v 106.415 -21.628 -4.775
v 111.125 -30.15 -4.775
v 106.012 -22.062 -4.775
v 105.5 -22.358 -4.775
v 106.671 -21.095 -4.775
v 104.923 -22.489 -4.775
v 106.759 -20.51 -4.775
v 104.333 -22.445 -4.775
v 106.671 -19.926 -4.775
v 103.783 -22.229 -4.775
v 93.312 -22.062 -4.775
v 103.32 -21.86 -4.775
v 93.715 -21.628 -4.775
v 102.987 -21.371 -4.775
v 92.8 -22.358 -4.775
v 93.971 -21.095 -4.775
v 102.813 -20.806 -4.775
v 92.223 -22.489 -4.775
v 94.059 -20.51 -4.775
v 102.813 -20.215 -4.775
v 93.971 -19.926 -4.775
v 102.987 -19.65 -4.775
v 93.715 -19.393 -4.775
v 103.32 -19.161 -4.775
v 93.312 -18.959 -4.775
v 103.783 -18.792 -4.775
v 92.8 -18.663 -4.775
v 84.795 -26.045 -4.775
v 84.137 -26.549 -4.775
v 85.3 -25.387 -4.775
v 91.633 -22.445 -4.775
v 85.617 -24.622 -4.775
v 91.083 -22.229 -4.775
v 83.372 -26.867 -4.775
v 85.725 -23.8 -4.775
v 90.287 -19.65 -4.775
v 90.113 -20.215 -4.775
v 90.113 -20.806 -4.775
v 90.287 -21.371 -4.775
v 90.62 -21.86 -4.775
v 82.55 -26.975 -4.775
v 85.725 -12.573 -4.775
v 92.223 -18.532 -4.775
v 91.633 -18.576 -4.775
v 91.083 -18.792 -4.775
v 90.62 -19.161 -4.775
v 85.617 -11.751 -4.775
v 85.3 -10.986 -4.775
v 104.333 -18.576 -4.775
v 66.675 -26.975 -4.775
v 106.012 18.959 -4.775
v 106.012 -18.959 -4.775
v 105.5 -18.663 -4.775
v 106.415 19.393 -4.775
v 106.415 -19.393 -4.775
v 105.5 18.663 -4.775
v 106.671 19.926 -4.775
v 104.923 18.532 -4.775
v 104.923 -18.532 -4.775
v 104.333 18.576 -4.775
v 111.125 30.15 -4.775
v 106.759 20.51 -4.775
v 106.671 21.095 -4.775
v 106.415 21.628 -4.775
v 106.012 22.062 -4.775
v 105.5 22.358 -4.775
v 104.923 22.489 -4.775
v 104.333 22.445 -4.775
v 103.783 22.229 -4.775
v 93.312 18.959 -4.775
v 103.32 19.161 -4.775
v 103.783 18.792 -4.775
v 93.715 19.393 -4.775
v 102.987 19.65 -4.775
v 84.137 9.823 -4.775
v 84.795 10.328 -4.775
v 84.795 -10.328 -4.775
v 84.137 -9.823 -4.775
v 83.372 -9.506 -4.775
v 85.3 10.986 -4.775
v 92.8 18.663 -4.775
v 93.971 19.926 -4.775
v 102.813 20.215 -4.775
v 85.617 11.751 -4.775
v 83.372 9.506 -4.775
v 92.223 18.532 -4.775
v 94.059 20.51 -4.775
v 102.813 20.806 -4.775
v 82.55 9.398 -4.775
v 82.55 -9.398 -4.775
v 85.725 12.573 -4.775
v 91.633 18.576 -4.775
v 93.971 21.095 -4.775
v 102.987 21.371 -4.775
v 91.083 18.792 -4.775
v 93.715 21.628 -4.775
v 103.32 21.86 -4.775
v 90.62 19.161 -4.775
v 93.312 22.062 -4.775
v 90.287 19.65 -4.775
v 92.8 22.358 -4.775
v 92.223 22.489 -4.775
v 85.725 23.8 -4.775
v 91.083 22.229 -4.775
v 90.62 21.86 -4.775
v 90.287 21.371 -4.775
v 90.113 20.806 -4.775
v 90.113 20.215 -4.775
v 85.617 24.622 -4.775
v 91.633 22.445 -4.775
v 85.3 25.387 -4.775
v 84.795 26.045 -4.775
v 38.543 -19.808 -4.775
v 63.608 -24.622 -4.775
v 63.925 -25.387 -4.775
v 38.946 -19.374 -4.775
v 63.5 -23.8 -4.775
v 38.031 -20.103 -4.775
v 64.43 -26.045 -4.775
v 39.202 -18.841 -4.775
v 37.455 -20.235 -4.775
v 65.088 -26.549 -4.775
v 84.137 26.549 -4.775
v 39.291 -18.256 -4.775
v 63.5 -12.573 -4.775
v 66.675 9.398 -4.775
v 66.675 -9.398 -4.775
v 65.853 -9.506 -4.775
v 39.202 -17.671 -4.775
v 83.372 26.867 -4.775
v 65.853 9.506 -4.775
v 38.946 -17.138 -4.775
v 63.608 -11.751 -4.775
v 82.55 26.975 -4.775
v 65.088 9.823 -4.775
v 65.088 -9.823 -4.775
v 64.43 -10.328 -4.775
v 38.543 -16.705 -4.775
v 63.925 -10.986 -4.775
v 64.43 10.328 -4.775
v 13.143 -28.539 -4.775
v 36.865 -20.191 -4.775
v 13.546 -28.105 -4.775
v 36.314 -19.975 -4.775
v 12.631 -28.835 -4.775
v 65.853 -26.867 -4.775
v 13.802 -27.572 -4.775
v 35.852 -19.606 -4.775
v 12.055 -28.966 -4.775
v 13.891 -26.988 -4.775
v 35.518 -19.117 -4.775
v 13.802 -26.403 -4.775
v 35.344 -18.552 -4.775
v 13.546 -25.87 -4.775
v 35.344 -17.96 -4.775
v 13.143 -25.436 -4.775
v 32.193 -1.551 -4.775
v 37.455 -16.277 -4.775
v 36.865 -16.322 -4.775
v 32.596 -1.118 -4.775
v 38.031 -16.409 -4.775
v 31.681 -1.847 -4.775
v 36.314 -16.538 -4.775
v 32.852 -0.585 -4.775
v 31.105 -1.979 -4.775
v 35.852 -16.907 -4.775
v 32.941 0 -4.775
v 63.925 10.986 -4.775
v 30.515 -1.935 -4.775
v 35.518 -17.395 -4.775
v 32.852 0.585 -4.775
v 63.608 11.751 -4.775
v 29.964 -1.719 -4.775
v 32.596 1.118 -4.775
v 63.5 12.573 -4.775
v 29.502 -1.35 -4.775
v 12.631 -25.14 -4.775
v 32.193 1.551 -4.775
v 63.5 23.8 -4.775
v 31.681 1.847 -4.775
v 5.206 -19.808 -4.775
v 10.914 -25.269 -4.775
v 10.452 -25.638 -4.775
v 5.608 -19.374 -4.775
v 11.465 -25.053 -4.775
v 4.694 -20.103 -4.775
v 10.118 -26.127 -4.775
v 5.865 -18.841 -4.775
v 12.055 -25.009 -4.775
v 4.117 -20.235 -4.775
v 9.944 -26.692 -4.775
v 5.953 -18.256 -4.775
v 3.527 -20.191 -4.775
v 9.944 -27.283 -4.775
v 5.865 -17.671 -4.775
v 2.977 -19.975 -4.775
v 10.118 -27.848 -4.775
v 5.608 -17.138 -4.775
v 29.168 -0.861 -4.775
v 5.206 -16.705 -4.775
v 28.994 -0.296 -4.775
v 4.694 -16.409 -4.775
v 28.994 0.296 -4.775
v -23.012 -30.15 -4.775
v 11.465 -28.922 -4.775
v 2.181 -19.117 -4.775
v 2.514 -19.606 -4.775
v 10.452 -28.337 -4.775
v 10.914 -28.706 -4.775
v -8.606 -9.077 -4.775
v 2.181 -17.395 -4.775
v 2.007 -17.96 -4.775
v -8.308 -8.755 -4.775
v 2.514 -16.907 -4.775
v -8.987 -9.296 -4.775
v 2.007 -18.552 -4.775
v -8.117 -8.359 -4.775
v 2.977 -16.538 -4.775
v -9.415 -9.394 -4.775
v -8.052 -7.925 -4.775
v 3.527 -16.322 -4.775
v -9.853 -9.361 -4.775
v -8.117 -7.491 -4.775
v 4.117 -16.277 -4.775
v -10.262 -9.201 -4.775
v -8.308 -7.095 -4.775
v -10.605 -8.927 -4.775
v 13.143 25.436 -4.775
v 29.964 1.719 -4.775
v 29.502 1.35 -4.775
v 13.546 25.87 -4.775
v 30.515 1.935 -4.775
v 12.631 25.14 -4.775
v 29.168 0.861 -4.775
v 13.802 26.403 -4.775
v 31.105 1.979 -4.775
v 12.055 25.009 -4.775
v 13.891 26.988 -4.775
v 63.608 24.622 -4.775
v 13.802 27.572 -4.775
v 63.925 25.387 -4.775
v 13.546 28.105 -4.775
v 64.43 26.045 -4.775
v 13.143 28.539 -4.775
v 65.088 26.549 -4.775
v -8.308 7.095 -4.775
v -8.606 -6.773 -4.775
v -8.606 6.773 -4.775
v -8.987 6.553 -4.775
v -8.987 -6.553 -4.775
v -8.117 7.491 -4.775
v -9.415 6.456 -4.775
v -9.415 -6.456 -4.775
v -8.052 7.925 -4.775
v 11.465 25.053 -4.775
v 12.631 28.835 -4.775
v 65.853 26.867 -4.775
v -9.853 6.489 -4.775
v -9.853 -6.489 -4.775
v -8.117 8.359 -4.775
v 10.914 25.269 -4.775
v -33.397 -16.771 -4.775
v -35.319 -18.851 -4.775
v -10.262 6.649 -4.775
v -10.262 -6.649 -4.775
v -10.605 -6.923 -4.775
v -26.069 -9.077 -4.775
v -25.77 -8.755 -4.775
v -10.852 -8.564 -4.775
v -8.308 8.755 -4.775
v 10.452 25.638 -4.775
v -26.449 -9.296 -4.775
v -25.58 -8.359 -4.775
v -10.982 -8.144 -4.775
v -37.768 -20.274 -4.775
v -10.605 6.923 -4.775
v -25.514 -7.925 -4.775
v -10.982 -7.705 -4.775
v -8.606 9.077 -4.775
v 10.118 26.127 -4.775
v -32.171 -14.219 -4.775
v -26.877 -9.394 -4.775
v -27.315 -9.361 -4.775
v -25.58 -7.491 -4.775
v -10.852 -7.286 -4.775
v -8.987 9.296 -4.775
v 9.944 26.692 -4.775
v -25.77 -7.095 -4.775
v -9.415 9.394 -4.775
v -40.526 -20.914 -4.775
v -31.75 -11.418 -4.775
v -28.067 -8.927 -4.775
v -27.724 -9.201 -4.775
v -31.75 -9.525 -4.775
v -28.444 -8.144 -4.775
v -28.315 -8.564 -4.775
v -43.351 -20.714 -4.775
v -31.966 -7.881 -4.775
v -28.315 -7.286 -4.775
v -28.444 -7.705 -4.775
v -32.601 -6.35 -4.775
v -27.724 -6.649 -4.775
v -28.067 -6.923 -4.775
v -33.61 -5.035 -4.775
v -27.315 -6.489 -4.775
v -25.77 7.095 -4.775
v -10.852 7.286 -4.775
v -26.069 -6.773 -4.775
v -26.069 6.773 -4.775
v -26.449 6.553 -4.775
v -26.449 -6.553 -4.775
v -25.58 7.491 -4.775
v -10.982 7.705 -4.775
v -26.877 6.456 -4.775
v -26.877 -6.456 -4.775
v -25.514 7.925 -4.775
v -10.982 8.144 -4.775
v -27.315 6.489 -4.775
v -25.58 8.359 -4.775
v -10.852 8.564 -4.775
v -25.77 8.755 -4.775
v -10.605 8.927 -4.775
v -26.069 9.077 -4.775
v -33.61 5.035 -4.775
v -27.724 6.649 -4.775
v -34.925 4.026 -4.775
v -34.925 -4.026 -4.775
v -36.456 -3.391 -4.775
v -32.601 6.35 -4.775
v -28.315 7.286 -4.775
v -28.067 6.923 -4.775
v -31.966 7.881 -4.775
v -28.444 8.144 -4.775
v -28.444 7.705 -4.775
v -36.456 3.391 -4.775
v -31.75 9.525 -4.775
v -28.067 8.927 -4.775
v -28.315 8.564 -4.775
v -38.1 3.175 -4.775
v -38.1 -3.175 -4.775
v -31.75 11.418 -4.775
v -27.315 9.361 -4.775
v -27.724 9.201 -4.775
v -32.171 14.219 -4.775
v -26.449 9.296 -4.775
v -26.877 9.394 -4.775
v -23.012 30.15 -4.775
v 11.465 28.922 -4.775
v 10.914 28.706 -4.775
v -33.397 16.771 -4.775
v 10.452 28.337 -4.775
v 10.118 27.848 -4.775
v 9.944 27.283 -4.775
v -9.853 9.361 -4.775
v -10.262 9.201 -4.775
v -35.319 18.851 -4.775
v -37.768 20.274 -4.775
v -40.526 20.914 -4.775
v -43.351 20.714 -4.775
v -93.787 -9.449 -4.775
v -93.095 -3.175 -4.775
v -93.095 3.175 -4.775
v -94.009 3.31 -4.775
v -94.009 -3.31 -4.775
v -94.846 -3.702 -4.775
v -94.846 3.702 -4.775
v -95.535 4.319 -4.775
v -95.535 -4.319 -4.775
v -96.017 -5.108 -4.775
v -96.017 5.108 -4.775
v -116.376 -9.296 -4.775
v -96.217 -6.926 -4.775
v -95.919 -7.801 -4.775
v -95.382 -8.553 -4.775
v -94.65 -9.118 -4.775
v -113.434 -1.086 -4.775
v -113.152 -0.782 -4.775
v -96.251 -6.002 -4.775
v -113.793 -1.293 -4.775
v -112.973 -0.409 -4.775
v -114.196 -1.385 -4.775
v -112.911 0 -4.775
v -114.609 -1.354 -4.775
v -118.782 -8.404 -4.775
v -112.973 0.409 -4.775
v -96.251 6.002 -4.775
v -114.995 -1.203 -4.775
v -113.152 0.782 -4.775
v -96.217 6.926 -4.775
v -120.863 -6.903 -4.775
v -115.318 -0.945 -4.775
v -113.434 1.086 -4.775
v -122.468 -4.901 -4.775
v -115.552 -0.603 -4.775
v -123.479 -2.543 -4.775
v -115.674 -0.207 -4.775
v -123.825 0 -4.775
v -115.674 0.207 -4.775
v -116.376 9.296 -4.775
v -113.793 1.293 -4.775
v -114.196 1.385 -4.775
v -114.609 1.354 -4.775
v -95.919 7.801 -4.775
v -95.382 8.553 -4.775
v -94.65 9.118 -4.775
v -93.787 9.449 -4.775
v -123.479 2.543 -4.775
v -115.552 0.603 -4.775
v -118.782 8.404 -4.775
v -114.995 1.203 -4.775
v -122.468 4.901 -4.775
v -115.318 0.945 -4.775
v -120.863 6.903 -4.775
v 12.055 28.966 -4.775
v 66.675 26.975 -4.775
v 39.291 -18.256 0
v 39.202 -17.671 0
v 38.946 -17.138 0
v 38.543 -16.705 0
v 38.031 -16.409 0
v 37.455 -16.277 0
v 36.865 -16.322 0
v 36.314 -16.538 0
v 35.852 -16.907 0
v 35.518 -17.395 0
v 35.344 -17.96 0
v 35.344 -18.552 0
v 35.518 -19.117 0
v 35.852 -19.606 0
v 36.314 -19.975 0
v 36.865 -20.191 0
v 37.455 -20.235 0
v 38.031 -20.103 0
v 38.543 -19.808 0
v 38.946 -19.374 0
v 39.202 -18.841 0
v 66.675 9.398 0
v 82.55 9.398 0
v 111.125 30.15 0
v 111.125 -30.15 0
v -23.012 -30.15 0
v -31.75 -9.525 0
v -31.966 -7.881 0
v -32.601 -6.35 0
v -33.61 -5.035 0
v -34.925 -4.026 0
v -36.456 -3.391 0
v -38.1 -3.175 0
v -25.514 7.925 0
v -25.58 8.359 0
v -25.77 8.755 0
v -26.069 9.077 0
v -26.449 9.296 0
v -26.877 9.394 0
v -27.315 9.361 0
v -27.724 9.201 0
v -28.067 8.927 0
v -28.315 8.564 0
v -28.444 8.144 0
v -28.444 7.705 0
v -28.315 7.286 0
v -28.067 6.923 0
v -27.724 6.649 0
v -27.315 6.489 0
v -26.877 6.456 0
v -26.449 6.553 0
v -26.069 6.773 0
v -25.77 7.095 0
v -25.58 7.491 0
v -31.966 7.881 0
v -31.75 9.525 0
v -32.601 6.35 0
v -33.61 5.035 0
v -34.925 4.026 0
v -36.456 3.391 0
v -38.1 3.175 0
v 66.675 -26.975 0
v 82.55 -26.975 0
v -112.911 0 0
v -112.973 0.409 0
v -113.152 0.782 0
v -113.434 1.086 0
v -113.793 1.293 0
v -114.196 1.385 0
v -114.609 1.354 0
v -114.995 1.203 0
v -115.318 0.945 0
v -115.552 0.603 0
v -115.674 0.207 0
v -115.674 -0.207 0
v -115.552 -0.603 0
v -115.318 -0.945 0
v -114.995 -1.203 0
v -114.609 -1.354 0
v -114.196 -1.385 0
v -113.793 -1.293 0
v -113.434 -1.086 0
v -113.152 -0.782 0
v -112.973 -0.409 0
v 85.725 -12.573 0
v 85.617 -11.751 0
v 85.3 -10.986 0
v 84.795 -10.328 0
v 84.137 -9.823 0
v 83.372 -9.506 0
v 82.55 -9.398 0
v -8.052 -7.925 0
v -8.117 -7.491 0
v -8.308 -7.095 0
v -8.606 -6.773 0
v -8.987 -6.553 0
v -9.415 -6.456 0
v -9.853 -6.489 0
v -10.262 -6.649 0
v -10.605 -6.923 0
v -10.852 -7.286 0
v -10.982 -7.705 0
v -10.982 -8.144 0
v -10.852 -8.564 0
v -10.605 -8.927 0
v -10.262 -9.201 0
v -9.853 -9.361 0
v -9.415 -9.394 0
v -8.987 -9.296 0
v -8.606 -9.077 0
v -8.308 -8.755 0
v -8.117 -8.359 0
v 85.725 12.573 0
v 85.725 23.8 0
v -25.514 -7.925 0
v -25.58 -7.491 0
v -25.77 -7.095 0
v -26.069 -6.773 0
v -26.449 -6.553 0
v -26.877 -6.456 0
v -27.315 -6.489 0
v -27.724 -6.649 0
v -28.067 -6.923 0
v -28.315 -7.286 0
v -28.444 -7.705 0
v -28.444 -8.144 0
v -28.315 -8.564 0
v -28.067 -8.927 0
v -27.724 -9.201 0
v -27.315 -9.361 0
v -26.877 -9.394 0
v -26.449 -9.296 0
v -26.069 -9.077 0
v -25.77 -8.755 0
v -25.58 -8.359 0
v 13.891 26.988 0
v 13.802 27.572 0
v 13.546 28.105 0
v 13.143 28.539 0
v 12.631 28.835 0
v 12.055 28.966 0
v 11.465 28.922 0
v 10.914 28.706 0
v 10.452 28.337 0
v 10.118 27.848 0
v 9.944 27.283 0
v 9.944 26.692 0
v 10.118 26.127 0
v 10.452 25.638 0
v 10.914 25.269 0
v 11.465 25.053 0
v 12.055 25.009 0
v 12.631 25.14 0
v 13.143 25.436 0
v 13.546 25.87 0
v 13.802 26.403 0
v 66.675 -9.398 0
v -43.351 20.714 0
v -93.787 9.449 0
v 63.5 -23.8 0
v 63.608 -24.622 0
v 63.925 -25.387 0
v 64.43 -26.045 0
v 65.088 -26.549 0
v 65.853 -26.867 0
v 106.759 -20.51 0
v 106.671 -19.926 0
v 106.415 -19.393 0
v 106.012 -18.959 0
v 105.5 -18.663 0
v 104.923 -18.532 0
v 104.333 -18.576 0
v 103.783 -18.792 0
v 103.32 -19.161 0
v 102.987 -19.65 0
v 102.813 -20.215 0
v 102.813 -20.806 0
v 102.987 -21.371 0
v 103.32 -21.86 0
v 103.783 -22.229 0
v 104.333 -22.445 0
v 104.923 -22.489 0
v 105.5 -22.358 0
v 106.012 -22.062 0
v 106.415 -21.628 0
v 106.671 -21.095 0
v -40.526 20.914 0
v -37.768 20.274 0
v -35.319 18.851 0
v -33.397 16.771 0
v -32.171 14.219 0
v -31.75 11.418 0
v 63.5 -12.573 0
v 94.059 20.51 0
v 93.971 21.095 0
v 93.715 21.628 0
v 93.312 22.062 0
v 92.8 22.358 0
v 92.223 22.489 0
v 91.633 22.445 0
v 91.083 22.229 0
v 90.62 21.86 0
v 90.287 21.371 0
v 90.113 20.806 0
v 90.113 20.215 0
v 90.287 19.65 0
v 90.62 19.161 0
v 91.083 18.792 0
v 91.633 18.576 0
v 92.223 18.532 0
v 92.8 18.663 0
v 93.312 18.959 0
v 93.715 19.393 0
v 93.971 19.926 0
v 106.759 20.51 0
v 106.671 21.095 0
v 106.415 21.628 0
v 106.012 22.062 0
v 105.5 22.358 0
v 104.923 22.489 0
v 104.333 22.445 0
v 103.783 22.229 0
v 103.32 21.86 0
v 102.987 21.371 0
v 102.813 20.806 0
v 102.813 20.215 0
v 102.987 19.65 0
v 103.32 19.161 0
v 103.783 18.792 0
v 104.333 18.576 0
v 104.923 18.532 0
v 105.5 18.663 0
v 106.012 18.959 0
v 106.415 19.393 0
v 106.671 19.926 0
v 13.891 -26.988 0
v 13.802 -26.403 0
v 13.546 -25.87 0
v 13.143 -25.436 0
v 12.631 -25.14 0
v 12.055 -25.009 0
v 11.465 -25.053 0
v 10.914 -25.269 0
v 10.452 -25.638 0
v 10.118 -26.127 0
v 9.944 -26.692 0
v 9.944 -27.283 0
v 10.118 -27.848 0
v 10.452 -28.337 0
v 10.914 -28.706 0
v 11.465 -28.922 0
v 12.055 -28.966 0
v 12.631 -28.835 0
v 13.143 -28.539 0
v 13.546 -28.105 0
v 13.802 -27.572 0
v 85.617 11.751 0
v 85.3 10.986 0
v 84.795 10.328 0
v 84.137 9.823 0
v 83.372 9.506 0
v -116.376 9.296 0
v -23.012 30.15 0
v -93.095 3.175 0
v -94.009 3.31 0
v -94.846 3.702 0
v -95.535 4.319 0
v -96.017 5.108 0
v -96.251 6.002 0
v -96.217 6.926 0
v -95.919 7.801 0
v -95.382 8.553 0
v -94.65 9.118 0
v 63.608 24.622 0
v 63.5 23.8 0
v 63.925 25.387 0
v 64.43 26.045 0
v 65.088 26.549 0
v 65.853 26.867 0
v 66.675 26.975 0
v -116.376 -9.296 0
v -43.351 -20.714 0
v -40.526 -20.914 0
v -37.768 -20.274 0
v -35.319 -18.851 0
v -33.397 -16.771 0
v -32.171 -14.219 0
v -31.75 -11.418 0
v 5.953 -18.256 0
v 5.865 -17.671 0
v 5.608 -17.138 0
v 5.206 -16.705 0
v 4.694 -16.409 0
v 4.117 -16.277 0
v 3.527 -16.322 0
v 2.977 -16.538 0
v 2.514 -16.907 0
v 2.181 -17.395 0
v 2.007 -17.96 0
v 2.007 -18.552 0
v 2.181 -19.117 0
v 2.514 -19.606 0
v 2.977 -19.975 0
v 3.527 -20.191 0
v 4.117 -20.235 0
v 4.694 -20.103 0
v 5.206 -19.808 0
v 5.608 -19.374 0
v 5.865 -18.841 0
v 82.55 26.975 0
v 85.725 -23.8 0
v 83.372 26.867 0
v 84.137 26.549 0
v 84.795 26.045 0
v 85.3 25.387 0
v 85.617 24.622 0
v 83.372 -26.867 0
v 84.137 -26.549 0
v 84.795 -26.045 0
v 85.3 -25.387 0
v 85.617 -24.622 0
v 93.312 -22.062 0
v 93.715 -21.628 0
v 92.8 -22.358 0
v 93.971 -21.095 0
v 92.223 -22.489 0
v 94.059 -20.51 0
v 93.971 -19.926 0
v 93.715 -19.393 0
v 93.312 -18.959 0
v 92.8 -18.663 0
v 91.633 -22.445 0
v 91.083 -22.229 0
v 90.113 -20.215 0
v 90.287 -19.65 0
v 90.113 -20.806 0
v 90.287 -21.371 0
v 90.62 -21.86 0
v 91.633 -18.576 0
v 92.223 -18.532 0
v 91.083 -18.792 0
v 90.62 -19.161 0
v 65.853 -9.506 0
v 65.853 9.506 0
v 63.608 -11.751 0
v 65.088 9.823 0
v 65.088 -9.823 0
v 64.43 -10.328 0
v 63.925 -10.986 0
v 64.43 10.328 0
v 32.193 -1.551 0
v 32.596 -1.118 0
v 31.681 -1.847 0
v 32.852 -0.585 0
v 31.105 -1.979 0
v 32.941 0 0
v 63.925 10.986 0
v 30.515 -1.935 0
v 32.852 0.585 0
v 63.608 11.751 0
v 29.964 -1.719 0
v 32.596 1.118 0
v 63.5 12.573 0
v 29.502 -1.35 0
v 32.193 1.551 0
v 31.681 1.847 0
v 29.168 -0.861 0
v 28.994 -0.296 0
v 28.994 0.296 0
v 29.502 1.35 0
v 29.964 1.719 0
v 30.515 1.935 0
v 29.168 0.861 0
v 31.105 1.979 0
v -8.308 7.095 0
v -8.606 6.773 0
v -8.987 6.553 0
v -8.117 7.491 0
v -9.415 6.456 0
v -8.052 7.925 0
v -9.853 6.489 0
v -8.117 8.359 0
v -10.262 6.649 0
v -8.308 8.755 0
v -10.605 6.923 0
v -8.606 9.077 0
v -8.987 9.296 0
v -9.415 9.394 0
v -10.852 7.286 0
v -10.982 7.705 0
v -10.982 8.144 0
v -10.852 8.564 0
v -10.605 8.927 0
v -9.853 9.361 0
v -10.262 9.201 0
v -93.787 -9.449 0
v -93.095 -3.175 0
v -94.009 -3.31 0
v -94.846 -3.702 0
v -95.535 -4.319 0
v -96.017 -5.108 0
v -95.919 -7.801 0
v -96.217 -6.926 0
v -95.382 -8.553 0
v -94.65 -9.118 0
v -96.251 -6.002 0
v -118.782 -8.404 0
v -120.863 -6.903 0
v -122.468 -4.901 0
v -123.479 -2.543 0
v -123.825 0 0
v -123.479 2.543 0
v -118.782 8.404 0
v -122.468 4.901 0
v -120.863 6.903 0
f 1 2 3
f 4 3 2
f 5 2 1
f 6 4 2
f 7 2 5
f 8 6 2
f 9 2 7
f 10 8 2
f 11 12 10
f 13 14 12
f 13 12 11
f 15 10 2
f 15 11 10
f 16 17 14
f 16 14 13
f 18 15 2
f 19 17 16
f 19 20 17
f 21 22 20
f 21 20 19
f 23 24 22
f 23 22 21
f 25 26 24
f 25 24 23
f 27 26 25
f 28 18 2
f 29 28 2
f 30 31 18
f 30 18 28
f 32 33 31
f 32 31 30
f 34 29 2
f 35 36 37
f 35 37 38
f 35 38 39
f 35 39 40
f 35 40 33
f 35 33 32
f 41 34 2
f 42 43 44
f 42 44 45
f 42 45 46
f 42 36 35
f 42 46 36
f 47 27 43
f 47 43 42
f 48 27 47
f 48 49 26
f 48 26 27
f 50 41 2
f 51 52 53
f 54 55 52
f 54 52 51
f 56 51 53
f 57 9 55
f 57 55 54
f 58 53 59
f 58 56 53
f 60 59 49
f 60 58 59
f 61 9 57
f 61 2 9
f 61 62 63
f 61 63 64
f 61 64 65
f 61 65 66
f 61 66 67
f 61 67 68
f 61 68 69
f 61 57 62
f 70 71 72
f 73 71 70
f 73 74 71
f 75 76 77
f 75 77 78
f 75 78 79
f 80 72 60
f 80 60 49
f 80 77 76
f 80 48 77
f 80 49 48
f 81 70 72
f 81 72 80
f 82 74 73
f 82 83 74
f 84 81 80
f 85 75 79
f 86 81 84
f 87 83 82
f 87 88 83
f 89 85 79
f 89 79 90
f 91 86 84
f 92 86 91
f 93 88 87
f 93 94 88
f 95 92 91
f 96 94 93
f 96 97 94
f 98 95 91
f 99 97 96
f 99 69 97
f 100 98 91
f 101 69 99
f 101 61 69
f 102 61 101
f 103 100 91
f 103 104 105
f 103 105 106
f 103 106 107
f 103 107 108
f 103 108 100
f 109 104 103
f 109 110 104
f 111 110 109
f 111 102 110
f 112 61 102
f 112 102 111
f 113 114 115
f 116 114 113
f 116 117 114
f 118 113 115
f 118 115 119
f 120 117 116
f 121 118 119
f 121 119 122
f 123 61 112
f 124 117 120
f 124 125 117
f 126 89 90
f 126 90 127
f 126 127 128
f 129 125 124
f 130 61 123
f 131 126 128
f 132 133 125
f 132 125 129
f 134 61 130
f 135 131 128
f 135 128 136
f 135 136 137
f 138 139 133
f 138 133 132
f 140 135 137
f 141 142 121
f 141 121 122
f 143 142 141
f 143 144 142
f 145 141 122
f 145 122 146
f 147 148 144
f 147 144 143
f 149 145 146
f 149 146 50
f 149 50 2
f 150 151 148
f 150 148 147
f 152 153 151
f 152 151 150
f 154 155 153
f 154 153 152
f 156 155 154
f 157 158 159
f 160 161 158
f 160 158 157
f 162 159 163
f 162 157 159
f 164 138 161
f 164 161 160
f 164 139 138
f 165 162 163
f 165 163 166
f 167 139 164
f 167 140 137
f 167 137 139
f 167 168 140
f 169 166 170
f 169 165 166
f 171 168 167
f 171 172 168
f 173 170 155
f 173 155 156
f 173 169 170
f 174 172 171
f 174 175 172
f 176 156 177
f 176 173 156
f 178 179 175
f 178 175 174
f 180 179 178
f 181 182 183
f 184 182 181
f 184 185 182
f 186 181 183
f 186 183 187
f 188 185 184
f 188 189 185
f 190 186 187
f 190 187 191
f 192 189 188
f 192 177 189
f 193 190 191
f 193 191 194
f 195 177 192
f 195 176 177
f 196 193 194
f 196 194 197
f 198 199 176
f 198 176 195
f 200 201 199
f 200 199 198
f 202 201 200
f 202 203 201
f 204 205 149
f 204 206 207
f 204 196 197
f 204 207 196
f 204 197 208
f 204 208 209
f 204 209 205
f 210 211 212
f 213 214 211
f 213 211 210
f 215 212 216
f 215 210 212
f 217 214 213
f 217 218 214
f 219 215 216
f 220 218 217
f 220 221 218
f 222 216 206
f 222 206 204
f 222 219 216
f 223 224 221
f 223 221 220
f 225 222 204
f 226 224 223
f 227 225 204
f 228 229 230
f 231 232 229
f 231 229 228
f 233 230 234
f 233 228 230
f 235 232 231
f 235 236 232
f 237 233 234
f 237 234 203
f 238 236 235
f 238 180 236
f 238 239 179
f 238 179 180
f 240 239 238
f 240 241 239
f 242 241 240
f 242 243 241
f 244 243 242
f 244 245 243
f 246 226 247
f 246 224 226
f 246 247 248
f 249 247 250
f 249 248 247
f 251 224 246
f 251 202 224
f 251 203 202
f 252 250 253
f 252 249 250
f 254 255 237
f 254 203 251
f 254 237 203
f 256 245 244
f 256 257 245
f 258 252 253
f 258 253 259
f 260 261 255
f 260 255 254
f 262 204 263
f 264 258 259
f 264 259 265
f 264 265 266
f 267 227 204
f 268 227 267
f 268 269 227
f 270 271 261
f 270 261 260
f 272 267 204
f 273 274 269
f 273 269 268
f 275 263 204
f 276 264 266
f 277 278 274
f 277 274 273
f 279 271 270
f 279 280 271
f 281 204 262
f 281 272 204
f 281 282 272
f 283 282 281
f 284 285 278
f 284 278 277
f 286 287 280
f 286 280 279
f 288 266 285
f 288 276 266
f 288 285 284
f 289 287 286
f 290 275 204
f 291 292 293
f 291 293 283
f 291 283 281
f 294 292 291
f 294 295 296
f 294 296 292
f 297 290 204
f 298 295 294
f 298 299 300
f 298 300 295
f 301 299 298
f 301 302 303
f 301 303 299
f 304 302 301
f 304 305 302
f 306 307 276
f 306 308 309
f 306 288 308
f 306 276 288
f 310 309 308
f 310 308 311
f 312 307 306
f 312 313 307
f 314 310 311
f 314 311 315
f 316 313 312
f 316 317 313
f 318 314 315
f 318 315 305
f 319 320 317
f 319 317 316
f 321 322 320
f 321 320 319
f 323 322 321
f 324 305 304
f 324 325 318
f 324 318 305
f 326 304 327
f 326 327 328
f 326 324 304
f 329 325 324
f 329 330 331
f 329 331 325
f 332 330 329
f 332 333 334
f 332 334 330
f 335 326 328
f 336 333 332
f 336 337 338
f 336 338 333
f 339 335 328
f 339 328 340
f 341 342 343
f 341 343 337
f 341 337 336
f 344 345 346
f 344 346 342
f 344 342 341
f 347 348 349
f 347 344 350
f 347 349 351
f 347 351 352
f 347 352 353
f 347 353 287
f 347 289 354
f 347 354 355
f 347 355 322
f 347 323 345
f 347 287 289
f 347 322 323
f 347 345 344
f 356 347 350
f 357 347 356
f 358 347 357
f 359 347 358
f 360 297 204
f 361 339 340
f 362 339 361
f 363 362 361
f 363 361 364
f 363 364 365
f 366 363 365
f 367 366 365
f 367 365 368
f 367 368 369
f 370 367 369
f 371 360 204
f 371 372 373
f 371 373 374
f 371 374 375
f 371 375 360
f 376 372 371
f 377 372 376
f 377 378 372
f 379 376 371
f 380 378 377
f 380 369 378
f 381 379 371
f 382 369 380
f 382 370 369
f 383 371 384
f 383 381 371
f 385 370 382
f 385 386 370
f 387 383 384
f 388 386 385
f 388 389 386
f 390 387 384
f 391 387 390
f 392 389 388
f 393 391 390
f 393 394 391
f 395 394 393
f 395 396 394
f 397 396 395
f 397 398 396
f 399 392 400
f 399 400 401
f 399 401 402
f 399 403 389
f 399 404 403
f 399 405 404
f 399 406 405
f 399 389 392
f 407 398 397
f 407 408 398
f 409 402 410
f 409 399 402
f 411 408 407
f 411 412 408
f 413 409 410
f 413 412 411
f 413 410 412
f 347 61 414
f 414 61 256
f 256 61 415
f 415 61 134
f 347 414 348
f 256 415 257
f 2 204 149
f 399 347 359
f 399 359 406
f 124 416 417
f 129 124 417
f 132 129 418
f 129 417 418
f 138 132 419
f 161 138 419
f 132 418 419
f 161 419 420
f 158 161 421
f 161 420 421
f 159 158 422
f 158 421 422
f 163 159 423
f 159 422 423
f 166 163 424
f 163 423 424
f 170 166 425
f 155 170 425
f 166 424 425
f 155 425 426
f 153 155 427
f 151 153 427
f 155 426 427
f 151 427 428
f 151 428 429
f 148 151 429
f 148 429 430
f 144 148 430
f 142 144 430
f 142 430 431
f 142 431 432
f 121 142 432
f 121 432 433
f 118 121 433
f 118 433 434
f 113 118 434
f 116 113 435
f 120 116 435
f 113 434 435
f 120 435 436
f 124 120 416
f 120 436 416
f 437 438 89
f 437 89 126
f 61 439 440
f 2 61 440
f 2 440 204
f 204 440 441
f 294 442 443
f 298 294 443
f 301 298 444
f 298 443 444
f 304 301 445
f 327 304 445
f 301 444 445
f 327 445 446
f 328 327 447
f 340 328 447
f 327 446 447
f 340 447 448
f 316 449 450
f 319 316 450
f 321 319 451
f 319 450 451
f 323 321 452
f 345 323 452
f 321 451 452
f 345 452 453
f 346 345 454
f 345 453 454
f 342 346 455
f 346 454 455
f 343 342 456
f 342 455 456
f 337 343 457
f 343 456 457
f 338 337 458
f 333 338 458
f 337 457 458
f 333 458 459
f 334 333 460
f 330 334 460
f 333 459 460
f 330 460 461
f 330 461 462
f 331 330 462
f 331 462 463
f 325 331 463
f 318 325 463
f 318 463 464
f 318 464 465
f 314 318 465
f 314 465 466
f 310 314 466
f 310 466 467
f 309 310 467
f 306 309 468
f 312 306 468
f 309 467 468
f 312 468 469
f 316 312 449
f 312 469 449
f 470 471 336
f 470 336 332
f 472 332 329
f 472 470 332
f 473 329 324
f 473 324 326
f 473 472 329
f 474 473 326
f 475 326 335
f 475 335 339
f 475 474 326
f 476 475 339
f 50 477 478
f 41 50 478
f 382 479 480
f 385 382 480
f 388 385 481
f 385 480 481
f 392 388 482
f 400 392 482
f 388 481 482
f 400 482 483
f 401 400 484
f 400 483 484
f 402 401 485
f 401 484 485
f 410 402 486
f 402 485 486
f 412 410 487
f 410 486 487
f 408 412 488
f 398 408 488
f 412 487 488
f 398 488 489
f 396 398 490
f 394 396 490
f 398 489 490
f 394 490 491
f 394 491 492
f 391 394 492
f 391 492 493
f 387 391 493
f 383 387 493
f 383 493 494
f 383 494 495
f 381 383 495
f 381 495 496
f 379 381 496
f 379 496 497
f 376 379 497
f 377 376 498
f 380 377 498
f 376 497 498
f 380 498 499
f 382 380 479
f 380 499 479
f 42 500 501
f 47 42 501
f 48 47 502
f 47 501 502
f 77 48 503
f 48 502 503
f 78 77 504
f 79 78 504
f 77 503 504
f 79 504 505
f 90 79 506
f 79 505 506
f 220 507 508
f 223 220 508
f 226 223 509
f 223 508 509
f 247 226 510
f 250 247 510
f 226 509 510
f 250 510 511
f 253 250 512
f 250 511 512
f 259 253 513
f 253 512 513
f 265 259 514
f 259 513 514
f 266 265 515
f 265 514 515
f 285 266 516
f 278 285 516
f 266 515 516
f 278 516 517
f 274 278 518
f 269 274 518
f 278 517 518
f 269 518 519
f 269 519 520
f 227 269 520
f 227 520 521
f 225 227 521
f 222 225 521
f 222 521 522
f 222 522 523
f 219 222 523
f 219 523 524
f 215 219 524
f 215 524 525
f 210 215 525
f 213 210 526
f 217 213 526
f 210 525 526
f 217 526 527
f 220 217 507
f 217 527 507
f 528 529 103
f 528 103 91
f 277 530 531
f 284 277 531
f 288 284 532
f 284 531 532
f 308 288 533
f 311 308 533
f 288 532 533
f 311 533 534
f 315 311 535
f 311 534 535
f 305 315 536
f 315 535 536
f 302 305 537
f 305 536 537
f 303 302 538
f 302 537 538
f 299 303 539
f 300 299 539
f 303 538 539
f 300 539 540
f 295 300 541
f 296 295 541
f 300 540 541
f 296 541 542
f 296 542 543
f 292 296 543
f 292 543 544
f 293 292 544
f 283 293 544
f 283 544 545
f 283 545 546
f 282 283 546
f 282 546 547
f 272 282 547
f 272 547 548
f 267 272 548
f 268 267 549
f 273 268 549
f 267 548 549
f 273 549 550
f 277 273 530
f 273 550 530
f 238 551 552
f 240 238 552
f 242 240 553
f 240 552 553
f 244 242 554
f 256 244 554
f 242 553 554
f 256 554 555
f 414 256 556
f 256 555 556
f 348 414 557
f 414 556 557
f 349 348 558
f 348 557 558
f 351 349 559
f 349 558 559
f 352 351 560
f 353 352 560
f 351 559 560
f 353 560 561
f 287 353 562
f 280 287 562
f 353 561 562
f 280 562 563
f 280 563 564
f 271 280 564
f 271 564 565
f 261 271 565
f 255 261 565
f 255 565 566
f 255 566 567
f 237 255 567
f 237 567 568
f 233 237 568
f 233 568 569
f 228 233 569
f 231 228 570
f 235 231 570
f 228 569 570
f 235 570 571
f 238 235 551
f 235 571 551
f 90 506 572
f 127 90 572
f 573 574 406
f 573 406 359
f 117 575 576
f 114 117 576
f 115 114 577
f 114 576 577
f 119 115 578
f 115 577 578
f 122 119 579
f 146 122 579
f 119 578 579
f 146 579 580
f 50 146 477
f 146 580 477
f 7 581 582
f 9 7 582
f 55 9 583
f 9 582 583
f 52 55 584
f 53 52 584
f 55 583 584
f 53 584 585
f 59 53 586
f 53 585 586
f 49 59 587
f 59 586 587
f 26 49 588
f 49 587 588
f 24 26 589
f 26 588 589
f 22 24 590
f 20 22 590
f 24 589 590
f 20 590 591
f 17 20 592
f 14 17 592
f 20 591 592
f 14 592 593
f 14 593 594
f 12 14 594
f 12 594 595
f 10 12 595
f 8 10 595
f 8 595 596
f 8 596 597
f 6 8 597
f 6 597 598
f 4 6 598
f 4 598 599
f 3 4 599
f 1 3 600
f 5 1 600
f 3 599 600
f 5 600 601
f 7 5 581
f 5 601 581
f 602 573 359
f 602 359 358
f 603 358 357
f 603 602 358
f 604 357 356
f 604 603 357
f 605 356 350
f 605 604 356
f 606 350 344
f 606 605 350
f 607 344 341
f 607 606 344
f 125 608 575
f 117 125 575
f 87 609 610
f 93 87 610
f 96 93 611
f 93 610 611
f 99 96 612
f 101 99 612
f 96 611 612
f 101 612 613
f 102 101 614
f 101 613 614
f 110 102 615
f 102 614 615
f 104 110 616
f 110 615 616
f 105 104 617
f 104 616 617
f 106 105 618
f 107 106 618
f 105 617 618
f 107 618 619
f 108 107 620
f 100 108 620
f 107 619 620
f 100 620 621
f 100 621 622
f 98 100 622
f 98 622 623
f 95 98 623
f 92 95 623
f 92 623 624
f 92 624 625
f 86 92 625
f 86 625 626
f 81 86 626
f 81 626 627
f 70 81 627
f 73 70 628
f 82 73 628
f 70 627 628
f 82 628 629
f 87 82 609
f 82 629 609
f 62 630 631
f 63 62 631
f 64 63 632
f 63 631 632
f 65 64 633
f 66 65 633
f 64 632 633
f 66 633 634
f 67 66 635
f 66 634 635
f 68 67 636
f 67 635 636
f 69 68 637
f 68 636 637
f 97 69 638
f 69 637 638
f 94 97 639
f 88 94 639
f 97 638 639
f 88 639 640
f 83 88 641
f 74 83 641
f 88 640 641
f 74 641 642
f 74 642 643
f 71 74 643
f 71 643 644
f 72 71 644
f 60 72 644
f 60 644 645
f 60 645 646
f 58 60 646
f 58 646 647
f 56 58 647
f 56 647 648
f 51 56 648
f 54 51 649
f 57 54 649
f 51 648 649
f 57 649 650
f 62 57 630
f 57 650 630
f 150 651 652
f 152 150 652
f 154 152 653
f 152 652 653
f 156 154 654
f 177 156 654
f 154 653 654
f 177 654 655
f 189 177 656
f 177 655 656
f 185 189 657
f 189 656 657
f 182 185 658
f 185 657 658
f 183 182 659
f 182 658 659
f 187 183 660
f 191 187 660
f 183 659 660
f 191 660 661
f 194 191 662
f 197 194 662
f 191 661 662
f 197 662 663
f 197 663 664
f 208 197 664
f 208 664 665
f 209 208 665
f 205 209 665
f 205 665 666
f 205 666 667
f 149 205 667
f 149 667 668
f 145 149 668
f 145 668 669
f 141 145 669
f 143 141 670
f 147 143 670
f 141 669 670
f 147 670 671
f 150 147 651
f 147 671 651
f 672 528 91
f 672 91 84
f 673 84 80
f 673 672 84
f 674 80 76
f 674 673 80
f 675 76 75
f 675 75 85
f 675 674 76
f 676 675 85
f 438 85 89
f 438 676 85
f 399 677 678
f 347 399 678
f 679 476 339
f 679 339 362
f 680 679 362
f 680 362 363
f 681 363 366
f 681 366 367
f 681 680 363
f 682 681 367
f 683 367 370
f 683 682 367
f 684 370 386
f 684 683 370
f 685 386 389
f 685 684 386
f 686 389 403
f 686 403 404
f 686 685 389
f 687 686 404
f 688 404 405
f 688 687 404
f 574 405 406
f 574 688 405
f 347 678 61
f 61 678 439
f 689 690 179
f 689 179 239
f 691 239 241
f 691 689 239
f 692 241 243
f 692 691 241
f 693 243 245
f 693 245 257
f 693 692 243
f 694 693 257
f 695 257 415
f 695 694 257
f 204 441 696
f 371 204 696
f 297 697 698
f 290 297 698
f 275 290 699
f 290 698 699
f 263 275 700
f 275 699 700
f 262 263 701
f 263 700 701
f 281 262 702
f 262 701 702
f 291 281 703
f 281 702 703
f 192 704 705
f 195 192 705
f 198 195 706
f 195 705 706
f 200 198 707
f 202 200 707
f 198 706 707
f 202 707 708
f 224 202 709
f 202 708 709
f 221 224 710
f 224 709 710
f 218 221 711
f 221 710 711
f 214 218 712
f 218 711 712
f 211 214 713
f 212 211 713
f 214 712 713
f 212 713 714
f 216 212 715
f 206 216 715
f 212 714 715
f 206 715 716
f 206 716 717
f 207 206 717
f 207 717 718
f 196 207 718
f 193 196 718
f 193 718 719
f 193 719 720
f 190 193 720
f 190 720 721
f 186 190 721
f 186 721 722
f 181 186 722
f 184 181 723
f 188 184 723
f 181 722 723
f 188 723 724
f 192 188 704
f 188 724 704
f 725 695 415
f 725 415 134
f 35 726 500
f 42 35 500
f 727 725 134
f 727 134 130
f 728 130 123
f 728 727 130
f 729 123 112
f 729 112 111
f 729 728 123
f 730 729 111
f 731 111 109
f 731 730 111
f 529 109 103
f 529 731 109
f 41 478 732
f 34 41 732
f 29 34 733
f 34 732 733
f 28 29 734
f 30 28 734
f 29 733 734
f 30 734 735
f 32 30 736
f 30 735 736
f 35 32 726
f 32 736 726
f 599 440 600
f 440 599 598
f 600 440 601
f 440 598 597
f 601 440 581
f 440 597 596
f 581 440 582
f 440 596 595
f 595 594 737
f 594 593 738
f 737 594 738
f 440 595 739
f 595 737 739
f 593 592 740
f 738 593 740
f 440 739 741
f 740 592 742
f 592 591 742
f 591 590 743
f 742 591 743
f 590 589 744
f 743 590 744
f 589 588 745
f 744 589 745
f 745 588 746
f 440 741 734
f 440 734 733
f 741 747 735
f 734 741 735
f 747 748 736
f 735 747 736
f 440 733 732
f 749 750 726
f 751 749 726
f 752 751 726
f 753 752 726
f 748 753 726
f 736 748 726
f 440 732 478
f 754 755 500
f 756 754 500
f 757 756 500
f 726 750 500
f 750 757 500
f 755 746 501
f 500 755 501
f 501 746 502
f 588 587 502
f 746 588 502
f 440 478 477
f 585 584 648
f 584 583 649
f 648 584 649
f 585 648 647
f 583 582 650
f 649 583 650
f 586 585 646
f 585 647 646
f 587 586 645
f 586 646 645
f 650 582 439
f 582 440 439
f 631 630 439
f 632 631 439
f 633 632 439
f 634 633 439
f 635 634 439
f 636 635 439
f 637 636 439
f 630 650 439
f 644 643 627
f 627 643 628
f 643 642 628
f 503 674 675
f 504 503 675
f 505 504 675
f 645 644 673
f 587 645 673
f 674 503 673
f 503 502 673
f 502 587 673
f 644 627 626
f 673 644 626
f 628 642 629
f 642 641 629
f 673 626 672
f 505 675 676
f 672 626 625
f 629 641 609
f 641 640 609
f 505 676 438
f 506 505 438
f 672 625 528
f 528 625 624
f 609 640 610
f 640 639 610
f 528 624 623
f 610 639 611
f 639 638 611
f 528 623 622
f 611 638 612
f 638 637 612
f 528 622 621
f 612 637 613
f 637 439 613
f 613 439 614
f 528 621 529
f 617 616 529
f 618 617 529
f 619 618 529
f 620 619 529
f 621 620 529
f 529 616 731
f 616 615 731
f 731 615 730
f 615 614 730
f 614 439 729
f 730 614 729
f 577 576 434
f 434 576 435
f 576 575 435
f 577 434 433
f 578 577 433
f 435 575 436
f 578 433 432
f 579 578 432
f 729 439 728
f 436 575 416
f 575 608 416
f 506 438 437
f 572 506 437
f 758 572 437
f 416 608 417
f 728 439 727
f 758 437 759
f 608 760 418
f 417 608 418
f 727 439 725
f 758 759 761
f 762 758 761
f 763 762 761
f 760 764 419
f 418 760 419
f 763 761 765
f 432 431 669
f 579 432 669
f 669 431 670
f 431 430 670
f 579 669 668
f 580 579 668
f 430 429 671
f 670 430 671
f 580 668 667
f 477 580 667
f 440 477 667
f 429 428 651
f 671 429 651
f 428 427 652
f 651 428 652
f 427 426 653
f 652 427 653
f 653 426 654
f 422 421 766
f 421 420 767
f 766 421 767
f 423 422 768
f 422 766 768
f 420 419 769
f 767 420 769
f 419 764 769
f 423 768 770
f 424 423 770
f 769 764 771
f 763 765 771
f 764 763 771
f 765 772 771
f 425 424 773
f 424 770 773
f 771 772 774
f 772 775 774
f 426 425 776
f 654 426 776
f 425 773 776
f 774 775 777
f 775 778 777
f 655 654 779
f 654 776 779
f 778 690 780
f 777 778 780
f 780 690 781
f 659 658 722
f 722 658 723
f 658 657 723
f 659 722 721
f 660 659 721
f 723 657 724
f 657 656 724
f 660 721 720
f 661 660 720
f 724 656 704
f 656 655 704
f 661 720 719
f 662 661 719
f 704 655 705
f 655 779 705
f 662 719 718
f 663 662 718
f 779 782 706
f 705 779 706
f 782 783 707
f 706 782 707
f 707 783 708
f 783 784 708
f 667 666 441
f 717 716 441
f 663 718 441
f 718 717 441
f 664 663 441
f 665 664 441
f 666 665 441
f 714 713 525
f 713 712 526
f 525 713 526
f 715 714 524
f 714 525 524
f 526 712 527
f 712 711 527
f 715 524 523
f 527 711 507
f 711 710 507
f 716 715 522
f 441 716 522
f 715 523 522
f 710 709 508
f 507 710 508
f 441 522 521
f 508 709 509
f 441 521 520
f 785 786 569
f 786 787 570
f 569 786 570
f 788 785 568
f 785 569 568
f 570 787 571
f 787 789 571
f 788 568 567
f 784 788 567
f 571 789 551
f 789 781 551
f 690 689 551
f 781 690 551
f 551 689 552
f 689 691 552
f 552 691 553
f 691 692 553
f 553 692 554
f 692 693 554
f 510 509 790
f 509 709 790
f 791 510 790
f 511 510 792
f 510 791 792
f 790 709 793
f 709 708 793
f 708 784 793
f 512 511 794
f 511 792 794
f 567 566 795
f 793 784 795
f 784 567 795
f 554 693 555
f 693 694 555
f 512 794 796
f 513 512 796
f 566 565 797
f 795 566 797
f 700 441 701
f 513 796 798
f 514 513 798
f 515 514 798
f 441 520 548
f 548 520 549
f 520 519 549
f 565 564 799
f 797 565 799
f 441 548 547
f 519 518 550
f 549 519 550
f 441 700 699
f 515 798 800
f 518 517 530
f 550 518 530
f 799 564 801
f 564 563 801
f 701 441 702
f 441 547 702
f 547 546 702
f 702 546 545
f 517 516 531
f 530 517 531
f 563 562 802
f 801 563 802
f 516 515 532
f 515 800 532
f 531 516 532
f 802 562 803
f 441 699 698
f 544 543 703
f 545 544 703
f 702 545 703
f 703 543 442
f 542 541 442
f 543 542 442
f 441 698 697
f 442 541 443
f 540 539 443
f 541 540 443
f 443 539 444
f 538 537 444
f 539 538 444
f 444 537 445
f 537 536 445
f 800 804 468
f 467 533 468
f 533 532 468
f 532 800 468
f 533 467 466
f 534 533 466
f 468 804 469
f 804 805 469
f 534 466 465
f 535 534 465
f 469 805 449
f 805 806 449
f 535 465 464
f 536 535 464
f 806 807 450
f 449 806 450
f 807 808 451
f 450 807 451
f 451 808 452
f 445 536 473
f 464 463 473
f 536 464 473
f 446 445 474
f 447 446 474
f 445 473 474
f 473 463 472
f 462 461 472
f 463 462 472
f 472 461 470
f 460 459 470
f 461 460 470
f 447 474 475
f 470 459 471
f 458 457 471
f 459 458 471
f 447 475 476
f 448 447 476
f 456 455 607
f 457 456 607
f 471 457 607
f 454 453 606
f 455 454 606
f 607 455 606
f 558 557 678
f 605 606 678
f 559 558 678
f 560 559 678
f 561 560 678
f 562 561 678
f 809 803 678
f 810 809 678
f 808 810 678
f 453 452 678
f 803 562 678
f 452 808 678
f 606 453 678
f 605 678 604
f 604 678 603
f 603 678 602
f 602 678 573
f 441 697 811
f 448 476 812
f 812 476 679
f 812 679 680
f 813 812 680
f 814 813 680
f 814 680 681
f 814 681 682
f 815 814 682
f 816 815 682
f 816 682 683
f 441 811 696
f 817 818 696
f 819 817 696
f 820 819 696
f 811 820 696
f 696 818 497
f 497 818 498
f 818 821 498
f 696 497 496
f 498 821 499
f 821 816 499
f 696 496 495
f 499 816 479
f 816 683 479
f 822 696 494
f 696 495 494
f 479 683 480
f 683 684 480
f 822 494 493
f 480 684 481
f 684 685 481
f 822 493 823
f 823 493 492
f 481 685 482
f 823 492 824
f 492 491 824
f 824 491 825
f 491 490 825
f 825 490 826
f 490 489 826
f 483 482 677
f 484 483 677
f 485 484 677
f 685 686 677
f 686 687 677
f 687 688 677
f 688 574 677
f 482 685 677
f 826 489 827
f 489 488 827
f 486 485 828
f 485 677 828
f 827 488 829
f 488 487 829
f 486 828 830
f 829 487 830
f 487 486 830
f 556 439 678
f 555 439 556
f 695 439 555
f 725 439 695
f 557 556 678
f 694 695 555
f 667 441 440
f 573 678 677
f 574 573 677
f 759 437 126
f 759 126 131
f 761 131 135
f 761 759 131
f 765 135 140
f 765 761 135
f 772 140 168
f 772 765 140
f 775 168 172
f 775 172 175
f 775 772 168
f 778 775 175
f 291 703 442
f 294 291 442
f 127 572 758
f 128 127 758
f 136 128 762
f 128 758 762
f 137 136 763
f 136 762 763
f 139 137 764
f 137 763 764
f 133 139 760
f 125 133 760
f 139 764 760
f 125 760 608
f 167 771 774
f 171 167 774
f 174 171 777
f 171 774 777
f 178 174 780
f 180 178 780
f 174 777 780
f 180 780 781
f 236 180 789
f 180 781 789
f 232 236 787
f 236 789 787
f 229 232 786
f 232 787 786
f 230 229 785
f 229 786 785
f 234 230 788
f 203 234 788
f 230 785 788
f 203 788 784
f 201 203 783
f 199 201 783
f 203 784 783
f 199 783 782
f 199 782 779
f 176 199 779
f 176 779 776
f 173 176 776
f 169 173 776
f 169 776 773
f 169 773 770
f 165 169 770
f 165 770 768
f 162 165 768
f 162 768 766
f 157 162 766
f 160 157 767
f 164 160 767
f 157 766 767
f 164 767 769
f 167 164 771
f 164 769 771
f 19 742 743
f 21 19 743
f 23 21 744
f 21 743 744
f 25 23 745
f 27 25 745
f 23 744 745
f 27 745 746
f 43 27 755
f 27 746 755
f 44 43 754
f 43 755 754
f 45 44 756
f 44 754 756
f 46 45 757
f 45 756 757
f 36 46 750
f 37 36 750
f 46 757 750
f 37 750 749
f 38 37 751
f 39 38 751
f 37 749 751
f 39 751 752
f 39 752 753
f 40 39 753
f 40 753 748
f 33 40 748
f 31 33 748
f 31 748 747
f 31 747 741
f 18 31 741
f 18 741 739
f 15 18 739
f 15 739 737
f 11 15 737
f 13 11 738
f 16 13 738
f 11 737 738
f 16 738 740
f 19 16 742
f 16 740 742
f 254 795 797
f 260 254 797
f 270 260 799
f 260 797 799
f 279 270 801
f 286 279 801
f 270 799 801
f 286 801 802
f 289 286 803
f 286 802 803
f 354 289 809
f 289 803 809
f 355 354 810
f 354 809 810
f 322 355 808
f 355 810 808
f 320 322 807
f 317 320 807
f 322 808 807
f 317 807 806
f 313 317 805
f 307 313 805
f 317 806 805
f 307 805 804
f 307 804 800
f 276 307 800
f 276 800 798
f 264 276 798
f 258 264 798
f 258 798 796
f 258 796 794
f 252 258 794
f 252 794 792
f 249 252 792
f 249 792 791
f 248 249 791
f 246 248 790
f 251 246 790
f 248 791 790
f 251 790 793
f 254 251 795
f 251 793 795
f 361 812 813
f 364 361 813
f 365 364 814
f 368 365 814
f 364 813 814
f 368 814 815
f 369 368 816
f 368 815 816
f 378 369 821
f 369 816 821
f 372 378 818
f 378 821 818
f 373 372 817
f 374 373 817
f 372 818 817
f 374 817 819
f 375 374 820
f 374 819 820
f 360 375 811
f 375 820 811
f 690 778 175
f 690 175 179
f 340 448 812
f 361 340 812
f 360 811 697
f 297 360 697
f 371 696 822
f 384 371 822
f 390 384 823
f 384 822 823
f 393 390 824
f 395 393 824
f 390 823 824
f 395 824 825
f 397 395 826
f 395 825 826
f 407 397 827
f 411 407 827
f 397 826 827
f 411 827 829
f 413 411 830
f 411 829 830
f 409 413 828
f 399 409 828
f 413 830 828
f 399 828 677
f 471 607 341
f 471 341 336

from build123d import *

# Parameters (mm, degrees)
SKETCH1_R          = 1.3890625
SKETCH1_R_2        = 1.984375
EXTRUDE1_DEPTH     = 4.7752
SKETCH9_R          = 1.4732
SKETCH9_R_2        = 1.984375
CUT_EXTRUDE3_DEPTH = 4.7752


with BuildPart() as part:
    # Sketch1 → Extrude1 (new body)
    with BuildSketch(Plane.XY):
        with BuildLine():
            Line((-23.0124, 30.1498), (111.125, 30.1498))
            Line((111.125, 30.1498), (111.125, -30.1498))
            Line((111.125, -30.1498), (-23.0124, -30.1498))
            Line((-23.0124, -30.1498), (-116.376349272, -9.295934526))
            ThreePointArc((-116.376349272, -9.295934526), (-123.825, 0), (-116.376349272, 9.295934526))
            Line((-116.376349272, 9.295934526), (-23.0124, 30.1498))
        make_face()
        with Locations((-114.3, 0)):
            Circle(SKETCH1_R, mode=Mode.SUBTRACT)
        with Locations((104.775, -20.5105)):
            Circle(SKETCH1_R_2, mode=Mode.SUBTRACT)
        with Locations((92.075, -20.5105)):
            Circle(SKETCH1_R_2, mode=Mode.SUBTRACT)
        with Locations((104.775, 20.5105)):
            Circle(SKETCH1_R_2, mode=Mode.SUBTRACT)
        with Locations((92.075, 20.5105)):
            Circle(SKETCH1_R_2, mode=Mode.SUBTRACT)
        with BuildLine():
            Line((-93.787006647, 9.448644842), (-43.351349272, 20.714003926))
            ThreePointArc((-43.351349272, 20.714003926), (-35.318977914, 18.85119969), (-31.75, 11.4180694))
            Line((-31.75, 11.4180694), (-31.75, 9.525))
            ThreePointArc((-31.75, 9.525), (-33.609871939, 5.034871939), (-38.1, 3.175))
            Line((-38.1, 3.175), (-93.094890223, 3.175))
            ThreePointArc((-93.094890223, 3.175), (-96.250743703, 6.001842258), (-93.787006647, 9.448644842))
        make_face(mode=Mode.SUBTRACT)
        with BuildLine():
            Line((-93.787006647, -9.448644842), (-43.351349272, -20.714003926))
            ThreePointArc((-43.351349272, -20.714003926), (-35.318977914, -18.85119969), (-31.75, -11.4180694))
            Line((-31.75, -11.4180694), (-31.75, -9.525))
            ThreePointArc((-31.75, -9.525), (-33.609871939, -5.034871939), (-38.1, -3.175))
            Line((-38.1, -3.175), (-93.094890223, -3.175))
            ThreePointArc((-93.094890223, -3.175), (-96.250743703, -6.001842258), (-93.787006647, -9.448644842))
        make_face(mode=Mode.SUBTRACT)
        with BuildLine():
            Line((85.725, -23.7998), (85.725, -12.573))
            ThreePointArc((85.725, -12.573), (84.79506403, -10.32793597), (82.55, -9.398))
            Line((82.55, -9.398), (66.675, -9.398))
            ThreePointArc((66.675, -9.398), (64.42993597, -10.32793597), (63.5, -12.573))
            Line((63.5, -12.573), (63.5, -23.7998))
            ThreePointArc((63.5, -23.7998), (64.42993597, -26.04486403), (66.675, -26.9748))
            Line((66.675, -26.9748), (82.55, -26.9748))
            ThreePointArc((82.55, -26.9748), (84.79506403, -26.04486403), (85.725, -23.7998))
        make_face(mode=Mode.SUBTRACT)
        with BuildLine():
            Line((85.725, 23.7998), (85.725, 12.573))
            ThreePointArc((85.725, 12.573), (84.79506403, 10.32793597), (82.55, 9.398))
            Line((82.55, 9.398), (66.675, 9.398))
            ThreePointArc((66.675, 9.398), (64.42993597, 10.32793597), (63.5, 12.573))
            Line((63.5, 12.573), (63.5, 23.7998))
            ThreePointArc((63.5, 23.7998), (64.42993597, 26.04486403), (66.675, 26.9748))
            Line((66.675, 26.9748), (82.55, 26.9748))
            ThreePointArc((82.55, 26.9748), (84.79506403, 26.04486403), (85.725, 23.7998))
        make_face(mode=Mode.SUBTRACT)
    extrude(amount=-EXTRUDE1_DEPTH)

    # Sketch9 → Cut-Extrude3 (cut)
    with BuildSketch(Plane.XY):
        with Locations((-26.9875, 7.9248)):
            Circle(SKETCH9_R)
        with Locations((-9.525, -7.9248)):
            Circle(SKETCH9_R)
        with Locations((-26.9875, -7.9248)):
            Circle(SKETCH9_R)
        with Locations((11.90625, -26.9875)):
            Circle(SKETCH9_R_2)
        with Locations((-9.525, 7.9248)):
            Circle(SKETCH9_R)
        with Locations((11.90625, 26.9875)):
            Circle(SKETCH9_R_2)
        with Locations((30.95625, 0)):
            Circle(SKETCH9_R_2)
        with Locations((3.96875, -18.25625)):
            Circle(SKETCH9_R_2)
        with Locations((37.30625, -18.25625)):
            Circle(SKETCH9_R_2)
    extrude(amount=-CUT_EXTRUDE3_DEPTH, mode=Mode.SUBTRACT)


solid = part.part
